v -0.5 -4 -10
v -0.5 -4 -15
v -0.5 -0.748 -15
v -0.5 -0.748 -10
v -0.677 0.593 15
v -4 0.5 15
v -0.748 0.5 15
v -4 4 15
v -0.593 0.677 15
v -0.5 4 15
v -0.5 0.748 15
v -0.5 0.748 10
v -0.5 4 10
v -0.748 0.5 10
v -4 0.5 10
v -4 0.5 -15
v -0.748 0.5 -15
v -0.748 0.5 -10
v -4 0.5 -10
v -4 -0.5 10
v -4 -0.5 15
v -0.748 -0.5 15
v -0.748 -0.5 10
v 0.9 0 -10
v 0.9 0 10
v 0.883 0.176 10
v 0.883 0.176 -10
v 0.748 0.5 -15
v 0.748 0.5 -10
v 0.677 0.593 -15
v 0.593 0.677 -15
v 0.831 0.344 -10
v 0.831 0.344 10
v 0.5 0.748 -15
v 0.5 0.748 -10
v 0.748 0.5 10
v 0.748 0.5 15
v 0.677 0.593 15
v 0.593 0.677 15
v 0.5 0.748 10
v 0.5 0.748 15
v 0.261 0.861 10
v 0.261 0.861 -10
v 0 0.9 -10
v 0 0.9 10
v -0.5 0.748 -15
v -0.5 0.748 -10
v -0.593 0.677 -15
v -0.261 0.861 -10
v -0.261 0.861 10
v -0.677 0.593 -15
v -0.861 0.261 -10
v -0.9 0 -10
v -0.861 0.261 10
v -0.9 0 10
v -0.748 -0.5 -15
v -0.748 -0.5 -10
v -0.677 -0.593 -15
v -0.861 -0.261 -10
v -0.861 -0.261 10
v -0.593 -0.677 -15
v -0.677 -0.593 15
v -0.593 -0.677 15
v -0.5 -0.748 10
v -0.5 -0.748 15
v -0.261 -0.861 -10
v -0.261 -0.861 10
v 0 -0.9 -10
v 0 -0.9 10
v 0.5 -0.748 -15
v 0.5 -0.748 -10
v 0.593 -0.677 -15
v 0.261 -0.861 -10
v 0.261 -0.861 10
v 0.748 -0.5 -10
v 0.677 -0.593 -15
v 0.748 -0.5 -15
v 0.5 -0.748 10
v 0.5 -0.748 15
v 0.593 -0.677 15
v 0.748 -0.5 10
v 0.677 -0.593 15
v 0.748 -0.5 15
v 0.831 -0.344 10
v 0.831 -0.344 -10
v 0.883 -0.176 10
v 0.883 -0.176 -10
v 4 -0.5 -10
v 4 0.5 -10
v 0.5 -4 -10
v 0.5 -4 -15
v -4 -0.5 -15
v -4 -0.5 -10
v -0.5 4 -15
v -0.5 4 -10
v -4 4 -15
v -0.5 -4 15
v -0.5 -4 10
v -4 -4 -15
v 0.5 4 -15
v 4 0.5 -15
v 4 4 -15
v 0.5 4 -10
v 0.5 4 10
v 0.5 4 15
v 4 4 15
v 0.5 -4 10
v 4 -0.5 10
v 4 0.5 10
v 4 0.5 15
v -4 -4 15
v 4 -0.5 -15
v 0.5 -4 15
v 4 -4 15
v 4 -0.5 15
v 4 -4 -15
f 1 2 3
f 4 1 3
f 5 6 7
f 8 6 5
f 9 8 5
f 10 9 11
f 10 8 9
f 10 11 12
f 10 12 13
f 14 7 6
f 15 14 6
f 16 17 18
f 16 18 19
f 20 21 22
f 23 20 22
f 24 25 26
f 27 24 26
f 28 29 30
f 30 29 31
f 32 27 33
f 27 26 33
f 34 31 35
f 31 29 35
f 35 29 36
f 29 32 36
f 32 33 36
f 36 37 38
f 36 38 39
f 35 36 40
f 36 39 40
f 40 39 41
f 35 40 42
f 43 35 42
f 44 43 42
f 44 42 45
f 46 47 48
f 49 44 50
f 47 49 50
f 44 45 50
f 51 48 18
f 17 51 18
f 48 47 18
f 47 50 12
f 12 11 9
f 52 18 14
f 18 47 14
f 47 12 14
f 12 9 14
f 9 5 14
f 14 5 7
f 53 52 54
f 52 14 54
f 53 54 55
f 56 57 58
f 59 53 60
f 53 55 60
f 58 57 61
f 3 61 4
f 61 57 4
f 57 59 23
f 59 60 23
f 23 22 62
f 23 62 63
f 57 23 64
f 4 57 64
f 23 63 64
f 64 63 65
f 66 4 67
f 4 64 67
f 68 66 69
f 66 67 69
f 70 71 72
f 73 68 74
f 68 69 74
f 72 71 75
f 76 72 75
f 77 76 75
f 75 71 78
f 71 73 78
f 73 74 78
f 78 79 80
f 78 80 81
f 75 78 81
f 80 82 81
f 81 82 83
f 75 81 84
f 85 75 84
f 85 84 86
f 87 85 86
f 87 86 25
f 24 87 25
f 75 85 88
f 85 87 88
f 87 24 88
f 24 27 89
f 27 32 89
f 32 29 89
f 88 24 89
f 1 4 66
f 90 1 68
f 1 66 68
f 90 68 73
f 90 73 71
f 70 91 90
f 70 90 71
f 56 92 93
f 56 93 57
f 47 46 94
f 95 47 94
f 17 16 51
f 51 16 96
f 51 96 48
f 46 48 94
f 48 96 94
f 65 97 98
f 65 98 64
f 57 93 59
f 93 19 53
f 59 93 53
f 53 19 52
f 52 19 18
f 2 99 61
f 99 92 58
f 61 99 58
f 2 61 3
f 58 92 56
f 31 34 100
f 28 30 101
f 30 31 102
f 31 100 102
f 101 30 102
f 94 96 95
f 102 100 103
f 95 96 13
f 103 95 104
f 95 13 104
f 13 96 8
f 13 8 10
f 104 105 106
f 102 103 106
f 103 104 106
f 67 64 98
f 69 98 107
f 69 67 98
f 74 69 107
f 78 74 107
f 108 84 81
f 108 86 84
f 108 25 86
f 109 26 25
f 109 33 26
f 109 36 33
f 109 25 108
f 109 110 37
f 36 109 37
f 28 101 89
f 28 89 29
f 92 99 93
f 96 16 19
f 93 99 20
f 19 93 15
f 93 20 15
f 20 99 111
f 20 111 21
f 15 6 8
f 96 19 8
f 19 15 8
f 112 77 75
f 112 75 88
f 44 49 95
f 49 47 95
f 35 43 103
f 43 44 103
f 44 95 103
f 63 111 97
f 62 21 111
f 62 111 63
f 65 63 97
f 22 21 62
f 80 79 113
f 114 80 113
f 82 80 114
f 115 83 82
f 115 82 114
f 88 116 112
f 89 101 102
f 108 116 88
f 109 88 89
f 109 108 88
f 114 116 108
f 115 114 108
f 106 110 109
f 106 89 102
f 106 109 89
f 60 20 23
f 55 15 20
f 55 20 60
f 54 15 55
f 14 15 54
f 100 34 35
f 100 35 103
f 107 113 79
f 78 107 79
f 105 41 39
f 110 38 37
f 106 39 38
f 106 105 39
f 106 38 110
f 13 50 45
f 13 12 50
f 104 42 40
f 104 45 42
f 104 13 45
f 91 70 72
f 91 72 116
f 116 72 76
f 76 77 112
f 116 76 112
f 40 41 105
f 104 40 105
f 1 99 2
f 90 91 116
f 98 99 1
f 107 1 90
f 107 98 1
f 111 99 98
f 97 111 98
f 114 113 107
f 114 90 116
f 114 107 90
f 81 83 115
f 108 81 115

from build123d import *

# Parameters (mm, degrees)
F0_W          = 8
F0_H          = 8
F1_DEPTH      = 15
F1_DEPTH_BACK = 15
F2_R          = 0.9
F3_DEPTH      = 36.9
F4_W          = 4.5
F4_H          = 1
F4_W_2        = 1
F4_H_2        = 4.5
F5_DEPTH      = 5


# Not quite as in the source:
# - a pattern or mirror of a feature is missing from the dataset's text; its kind, count and spacing are read off the source's solid


with BuildPart() as f1:
    # F0 (on Top) → F1 (new body, two sides)
    with BuildSketch(Plane.XY) as f1_sk:
        Rectangle(F0_W, F0_H)
    extrude(amount=F1_DEPTH)
    extrude(f1_sk.sketch, amount=-F1_DEPTH_BACK)

    # F2 (on face) → F3 (cut)
    with BuildSketch(Plane.XY.offset(15)):
        Circle(F2_R)
    extrude(amount=-F3_DEPTH, mode=Mode.SUBTRACT)

    # F4 (on face) → F5 (cut)
    with BuildSketch(Plane.XY.offset(15)):
        with Locations((-2.75, 0)):
            Rectangle(F4_W, F4_H)
        Rectangle(F4_W_2, F4_H)
        with Locations((0, -2.75)):
            Rectangle(F4_W_2, F4_H_2)
        with Locations((2.75, 0)):
            Rectangle(F4_W, F4_H)
        with Locations((0, 2.75)):
            Rectangle(F4_W_2, F4_H_2)
    f5 = extrude(amount=-F5_DEPTH, mode=Mode.SUBTRACT)

    # F5_copies: F5 across plane
    add(f5.mirror(Plane(origin=(0, 0, 0), x_dir=(-1, 0, 0), z_dir=(0, 0, -1))), mode=Mode.SUBTRACT)


solid = f1.part
